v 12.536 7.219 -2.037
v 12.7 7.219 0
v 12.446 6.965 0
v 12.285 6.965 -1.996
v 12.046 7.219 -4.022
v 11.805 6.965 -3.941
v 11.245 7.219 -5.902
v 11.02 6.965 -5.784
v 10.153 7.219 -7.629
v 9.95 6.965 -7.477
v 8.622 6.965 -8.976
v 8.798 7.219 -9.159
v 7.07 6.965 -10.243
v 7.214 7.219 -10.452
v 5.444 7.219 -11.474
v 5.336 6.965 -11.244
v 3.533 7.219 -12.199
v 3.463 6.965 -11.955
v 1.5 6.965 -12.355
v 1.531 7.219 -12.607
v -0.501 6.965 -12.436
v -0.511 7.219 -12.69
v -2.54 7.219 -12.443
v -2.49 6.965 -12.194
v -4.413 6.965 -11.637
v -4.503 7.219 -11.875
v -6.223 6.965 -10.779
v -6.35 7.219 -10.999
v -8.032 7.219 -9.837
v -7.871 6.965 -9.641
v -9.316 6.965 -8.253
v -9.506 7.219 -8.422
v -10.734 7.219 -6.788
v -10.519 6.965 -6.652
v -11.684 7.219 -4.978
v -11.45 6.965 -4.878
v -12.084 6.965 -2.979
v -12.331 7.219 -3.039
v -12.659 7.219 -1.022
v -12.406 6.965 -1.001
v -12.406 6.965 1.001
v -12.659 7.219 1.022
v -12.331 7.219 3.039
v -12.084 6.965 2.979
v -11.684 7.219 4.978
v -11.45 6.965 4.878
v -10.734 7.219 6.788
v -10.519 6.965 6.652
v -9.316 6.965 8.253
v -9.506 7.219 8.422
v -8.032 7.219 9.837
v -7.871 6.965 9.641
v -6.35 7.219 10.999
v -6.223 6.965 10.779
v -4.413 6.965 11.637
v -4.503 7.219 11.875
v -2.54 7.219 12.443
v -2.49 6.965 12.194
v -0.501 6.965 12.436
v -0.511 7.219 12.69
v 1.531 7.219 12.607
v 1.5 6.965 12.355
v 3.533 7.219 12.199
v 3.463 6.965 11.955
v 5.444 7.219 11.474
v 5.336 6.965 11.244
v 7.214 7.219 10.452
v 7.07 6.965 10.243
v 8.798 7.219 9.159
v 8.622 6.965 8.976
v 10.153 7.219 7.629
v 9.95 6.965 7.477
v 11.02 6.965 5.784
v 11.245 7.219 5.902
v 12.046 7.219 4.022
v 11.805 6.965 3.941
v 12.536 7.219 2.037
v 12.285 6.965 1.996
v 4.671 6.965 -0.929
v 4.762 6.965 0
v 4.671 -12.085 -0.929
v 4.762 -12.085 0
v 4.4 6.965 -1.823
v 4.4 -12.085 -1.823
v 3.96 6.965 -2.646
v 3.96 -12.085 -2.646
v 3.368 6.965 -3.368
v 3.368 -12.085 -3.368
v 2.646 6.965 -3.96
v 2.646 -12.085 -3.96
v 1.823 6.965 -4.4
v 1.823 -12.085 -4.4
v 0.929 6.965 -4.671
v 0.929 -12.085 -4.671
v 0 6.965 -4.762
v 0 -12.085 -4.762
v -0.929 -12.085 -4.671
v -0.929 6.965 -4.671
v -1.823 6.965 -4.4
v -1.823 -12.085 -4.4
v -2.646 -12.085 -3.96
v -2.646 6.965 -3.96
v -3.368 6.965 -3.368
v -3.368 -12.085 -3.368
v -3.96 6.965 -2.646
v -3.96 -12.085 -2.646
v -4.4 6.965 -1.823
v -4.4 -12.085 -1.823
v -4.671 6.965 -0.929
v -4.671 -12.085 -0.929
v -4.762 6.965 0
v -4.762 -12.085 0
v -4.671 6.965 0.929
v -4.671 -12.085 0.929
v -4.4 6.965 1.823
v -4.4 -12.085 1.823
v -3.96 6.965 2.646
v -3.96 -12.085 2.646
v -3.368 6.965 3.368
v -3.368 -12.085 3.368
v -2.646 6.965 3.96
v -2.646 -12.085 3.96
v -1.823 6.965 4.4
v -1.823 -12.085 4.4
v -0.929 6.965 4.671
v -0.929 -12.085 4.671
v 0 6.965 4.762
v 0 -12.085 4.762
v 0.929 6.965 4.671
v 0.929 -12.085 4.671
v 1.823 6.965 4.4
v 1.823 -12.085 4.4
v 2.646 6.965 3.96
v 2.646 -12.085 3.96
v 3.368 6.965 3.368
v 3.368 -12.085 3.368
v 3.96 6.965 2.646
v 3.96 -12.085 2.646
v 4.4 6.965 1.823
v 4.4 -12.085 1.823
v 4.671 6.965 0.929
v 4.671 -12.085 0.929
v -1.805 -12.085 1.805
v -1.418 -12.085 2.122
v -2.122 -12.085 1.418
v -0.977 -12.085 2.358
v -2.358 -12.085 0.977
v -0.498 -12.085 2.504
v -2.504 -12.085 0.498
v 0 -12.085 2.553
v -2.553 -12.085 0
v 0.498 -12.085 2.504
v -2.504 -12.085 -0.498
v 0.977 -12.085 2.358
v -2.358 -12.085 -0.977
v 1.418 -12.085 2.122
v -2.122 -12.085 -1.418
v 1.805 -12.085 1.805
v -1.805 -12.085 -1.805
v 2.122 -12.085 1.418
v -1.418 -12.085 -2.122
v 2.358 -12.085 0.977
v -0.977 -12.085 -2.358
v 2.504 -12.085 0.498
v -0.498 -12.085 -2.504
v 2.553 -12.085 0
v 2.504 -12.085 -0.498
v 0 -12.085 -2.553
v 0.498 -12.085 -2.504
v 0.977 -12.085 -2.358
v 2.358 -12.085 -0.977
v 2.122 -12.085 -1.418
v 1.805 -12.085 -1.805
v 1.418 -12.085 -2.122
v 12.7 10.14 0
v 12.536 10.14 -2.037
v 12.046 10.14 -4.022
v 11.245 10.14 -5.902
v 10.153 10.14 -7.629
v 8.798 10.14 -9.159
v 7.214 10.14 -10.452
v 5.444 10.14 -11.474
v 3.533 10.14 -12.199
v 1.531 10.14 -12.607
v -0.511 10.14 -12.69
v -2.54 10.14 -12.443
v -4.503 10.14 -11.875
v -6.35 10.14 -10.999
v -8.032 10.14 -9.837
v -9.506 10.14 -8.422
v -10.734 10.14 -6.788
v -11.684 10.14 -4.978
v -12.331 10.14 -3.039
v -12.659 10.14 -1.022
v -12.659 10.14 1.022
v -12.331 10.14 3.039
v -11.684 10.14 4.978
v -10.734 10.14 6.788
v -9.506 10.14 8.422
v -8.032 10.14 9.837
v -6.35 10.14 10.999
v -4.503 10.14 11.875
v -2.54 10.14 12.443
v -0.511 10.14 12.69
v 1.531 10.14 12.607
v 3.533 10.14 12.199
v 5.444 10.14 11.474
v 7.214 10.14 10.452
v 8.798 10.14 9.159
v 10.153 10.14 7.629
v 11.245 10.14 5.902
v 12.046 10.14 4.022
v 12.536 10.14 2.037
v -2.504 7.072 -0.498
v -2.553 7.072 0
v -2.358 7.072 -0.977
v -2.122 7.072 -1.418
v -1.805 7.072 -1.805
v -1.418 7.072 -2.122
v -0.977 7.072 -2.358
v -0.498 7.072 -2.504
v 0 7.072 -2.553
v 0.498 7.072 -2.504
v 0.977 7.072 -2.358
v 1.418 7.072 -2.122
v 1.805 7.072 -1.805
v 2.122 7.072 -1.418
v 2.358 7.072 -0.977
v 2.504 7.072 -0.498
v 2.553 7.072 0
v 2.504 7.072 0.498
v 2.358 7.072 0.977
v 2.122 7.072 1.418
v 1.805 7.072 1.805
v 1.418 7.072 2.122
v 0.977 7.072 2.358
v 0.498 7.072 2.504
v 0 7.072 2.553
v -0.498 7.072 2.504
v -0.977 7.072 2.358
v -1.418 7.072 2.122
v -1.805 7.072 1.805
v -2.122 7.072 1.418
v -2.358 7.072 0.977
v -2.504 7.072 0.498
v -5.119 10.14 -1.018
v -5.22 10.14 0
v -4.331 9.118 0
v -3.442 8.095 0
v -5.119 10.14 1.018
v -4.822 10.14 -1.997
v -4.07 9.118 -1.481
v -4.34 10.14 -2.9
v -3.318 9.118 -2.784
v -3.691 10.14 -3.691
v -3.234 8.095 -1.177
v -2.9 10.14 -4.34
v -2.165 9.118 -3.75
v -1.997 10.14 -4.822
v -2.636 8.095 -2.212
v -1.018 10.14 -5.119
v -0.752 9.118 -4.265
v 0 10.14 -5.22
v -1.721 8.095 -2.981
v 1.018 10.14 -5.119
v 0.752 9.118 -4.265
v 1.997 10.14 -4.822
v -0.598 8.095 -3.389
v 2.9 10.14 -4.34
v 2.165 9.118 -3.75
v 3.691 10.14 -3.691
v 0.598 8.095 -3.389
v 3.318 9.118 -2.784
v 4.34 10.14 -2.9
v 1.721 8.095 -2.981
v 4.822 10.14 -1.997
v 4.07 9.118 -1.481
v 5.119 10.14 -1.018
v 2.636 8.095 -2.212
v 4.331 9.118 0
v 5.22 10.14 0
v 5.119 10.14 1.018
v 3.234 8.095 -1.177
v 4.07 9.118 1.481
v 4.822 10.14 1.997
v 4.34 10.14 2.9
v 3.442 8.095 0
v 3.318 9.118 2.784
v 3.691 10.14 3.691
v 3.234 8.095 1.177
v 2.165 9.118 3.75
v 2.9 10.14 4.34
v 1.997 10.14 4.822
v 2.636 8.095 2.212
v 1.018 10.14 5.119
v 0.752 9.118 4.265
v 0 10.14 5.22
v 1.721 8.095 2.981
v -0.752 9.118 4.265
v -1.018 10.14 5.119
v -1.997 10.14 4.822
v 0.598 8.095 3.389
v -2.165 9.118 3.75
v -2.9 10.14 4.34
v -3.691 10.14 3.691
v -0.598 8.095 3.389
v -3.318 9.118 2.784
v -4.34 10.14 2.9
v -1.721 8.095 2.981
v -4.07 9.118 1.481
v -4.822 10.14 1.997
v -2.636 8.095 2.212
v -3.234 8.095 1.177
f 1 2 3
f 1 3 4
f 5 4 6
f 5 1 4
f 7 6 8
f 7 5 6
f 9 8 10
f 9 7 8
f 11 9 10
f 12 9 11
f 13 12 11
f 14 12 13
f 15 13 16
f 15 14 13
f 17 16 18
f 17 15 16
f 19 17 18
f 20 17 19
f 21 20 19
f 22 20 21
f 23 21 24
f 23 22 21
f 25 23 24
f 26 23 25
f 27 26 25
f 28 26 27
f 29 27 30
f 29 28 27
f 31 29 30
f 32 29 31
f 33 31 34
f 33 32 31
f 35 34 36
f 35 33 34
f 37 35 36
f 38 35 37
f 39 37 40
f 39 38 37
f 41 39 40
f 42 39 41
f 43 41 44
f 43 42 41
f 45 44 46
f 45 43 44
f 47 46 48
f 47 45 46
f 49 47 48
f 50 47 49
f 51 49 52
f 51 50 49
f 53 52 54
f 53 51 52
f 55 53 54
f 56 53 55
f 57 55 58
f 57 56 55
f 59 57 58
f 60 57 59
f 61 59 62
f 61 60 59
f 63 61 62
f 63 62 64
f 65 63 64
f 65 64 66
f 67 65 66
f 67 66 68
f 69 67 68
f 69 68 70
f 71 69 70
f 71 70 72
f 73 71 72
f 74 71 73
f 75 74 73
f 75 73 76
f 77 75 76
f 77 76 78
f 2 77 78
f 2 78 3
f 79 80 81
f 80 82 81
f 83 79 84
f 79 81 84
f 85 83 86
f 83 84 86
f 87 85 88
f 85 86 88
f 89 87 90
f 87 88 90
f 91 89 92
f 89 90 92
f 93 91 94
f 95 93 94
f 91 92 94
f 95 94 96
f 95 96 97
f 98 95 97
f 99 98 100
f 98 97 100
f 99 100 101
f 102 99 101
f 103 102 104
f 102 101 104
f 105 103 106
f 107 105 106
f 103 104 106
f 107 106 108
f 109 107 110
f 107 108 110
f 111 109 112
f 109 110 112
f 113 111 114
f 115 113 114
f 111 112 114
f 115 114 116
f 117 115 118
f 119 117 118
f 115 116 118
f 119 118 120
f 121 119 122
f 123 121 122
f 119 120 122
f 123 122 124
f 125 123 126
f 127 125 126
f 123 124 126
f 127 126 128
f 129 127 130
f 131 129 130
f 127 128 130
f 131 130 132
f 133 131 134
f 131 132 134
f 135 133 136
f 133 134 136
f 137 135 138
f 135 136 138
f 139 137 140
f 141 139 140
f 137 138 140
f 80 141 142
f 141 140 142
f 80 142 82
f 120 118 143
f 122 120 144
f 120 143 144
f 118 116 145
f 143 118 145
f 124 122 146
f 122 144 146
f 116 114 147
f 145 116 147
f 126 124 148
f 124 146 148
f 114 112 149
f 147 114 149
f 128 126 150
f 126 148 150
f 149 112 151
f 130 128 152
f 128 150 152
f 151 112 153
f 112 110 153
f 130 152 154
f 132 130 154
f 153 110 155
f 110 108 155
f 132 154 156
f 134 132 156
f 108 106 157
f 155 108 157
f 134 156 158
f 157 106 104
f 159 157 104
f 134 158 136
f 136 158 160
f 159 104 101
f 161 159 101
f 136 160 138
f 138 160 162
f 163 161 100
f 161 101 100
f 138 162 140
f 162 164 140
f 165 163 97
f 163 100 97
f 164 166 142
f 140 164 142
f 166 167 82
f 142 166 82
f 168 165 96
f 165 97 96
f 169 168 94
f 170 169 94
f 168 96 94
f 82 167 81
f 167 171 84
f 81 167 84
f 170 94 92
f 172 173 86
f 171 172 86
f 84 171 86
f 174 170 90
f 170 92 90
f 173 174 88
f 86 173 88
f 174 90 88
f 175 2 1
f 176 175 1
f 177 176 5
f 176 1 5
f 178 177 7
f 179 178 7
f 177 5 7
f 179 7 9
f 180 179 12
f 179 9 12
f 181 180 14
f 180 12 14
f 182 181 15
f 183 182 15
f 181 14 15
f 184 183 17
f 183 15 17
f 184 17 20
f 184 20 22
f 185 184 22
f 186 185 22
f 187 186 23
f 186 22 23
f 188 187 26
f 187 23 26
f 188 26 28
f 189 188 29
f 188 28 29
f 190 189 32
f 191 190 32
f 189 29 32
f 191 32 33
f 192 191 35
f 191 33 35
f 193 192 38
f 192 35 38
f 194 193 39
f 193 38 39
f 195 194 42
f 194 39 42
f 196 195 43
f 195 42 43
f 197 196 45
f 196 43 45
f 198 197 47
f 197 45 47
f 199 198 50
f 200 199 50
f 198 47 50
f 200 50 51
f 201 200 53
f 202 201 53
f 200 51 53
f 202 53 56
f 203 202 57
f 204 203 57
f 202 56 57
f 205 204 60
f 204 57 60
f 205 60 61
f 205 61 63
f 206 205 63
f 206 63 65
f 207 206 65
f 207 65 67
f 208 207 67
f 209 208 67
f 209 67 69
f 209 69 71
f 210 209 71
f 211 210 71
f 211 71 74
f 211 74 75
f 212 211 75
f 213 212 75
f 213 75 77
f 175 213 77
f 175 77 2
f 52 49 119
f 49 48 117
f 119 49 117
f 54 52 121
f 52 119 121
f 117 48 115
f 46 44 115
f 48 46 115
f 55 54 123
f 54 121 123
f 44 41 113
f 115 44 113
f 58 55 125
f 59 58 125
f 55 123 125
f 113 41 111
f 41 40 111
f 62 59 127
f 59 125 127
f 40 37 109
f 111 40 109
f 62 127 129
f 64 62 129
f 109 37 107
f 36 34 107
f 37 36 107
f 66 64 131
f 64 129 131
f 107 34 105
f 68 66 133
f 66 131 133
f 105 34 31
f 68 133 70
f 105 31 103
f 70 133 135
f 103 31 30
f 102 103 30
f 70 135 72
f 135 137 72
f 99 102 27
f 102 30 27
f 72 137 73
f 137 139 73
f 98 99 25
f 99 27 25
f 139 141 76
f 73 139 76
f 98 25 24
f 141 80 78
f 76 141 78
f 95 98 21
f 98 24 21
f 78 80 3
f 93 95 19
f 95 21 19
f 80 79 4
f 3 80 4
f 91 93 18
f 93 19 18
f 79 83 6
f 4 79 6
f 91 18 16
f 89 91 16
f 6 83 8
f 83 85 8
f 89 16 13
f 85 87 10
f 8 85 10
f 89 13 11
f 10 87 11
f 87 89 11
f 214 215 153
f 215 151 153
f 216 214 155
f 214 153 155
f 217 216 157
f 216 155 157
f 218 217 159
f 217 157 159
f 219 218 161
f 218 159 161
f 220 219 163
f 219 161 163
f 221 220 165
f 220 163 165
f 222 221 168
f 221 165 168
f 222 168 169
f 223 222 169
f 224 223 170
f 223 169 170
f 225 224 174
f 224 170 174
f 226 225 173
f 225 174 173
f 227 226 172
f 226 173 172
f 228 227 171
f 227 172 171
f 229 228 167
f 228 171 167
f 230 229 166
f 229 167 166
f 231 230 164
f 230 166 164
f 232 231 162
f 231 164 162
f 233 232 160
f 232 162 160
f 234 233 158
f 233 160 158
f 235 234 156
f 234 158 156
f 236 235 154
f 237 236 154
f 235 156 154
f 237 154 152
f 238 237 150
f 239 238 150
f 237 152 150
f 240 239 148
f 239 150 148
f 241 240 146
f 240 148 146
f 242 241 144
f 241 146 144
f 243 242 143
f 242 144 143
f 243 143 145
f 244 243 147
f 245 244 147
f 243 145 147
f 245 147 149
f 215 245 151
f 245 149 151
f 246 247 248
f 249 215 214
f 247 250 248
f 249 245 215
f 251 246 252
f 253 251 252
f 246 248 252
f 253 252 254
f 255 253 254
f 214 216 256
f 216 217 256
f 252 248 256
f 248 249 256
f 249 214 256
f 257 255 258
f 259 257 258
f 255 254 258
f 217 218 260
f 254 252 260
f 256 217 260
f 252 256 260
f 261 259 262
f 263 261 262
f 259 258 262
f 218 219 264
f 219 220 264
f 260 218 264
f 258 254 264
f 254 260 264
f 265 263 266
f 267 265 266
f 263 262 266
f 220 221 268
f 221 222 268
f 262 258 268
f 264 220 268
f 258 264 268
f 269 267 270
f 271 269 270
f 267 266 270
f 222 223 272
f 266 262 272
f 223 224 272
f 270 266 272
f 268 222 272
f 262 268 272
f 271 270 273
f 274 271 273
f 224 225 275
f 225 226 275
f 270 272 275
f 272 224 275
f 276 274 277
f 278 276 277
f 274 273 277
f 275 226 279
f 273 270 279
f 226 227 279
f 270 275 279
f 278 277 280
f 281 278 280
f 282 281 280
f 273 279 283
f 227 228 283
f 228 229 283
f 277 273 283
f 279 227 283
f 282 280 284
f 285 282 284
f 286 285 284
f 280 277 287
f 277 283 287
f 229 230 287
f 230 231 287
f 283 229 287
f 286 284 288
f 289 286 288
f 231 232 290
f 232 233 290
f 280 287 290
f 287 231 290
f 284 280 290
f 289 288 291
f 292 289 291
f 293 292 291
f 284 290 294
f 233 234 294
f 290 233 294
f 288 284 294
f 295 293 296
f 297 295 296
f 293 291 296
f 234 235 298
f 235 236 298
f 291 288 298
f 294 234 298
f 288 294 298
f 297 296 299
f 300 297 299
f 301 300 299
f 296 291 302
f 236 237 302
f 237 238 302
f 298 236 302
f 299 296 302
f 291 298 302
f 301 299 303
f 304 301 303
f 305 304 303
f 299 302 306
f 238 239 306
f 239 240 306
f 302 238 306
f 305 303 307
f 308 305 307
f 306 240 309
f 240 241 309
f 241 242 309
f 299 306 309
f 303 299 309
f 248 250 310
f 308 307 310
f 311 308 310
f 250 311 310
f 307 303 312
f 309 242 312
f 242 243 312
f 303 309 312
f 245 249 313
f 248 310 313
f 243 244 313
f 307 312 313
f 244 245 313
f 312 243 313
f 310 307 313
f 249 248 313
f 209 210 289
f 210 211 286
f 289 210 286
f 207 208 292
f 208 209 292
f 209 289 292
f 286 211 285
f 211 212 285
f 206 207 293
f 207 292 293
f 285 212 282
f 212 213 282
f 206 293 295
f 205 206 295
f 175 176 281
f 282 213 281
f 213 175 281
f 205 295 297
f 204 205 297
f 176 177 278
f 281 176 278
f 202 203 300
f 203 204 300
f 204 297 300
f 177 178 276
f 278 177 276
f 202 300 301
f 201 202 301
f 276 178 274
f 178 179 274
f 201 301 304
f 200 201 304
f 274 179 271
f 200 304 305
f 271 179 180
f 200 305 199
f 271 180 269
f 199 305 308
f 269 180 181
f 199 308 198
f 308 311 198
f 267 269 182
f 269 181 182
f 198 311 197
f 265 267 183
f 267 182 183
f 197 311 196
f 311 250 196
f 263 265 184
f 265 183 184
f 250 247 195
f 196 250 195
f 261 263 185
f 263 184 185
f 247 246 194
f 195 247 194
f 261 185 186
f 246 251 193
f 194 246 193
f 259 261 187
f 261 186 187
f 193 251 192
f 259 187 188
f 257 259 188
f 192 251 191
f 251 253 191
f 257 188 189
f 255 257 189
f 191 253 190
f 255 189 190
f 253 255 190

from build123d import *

# Parameters (mm, degrees)
CSK_FOR_10_FLAT_HEAD_SOCKET_CAP_SCREW1_D           = 5.1054
CSK_FOR_10_FLAT_HEAD_SOCKET_CAP_SCREW1_CSINK_D     = 10.4394
CSK_FOR_10_FLAT_HEAD_SOCKET_CAP_SCREW1_CSINK_ANGLE = 82
CHAMFER1_SIZE                                      = 0.254


with BuildPart() as part:
    # Sketch2 → Revolve1 (revolve)
    with BuildSketch(Plane.XY, mode=Mode.PRIVATE) as revolve1_sk:
        Polygon((0, 10.140493615), (-12.7, 10.140493615), (-12.7, 6.965493615), (-4.7625, 6.965493615), (-4.7625, -12.084506385), (0, -12.084506385), align=None)
    revolve(revolve1_sk.sketch.rotate(Axis((0, -12.084506385, 0), (0, 1, 0)), 180), axis=Axis((0, -12.084506385, 0), (0, 1, 0)))

    # CSK for #10 Flat Head Socket Cap Screw1 (through all)
    with Locations(Plane(origin=(0, 10.140493615, 0), x_dir=(1, 0, 0), z_dir=(0, 1, 0))):
        with Locations((0, 0)):
            CounterSinkHole(CSK_FOR_10_FLAT_HEAD_SOCKET_CAP_SCREW1_D / 2, CSK_FOR_10_FLAT_HEAD_SOCKET_CAP_SCREW1_CSINK_D / 2, counter_sink_angle=CSK_FOR_10_FLAT_HEAD_SOCKET_CAP_SCREW1_CSINK_ANGLE)

    # Chamfer1
    chamfer1_edges = [part.edges().sort_by_distance(p)[0] for p in [
        (-12.7, 6.965493615, 0),
    ]]
    chamfer(chamfer1_edges, length=CHAMFER1_SIZE)


solid = part.part
